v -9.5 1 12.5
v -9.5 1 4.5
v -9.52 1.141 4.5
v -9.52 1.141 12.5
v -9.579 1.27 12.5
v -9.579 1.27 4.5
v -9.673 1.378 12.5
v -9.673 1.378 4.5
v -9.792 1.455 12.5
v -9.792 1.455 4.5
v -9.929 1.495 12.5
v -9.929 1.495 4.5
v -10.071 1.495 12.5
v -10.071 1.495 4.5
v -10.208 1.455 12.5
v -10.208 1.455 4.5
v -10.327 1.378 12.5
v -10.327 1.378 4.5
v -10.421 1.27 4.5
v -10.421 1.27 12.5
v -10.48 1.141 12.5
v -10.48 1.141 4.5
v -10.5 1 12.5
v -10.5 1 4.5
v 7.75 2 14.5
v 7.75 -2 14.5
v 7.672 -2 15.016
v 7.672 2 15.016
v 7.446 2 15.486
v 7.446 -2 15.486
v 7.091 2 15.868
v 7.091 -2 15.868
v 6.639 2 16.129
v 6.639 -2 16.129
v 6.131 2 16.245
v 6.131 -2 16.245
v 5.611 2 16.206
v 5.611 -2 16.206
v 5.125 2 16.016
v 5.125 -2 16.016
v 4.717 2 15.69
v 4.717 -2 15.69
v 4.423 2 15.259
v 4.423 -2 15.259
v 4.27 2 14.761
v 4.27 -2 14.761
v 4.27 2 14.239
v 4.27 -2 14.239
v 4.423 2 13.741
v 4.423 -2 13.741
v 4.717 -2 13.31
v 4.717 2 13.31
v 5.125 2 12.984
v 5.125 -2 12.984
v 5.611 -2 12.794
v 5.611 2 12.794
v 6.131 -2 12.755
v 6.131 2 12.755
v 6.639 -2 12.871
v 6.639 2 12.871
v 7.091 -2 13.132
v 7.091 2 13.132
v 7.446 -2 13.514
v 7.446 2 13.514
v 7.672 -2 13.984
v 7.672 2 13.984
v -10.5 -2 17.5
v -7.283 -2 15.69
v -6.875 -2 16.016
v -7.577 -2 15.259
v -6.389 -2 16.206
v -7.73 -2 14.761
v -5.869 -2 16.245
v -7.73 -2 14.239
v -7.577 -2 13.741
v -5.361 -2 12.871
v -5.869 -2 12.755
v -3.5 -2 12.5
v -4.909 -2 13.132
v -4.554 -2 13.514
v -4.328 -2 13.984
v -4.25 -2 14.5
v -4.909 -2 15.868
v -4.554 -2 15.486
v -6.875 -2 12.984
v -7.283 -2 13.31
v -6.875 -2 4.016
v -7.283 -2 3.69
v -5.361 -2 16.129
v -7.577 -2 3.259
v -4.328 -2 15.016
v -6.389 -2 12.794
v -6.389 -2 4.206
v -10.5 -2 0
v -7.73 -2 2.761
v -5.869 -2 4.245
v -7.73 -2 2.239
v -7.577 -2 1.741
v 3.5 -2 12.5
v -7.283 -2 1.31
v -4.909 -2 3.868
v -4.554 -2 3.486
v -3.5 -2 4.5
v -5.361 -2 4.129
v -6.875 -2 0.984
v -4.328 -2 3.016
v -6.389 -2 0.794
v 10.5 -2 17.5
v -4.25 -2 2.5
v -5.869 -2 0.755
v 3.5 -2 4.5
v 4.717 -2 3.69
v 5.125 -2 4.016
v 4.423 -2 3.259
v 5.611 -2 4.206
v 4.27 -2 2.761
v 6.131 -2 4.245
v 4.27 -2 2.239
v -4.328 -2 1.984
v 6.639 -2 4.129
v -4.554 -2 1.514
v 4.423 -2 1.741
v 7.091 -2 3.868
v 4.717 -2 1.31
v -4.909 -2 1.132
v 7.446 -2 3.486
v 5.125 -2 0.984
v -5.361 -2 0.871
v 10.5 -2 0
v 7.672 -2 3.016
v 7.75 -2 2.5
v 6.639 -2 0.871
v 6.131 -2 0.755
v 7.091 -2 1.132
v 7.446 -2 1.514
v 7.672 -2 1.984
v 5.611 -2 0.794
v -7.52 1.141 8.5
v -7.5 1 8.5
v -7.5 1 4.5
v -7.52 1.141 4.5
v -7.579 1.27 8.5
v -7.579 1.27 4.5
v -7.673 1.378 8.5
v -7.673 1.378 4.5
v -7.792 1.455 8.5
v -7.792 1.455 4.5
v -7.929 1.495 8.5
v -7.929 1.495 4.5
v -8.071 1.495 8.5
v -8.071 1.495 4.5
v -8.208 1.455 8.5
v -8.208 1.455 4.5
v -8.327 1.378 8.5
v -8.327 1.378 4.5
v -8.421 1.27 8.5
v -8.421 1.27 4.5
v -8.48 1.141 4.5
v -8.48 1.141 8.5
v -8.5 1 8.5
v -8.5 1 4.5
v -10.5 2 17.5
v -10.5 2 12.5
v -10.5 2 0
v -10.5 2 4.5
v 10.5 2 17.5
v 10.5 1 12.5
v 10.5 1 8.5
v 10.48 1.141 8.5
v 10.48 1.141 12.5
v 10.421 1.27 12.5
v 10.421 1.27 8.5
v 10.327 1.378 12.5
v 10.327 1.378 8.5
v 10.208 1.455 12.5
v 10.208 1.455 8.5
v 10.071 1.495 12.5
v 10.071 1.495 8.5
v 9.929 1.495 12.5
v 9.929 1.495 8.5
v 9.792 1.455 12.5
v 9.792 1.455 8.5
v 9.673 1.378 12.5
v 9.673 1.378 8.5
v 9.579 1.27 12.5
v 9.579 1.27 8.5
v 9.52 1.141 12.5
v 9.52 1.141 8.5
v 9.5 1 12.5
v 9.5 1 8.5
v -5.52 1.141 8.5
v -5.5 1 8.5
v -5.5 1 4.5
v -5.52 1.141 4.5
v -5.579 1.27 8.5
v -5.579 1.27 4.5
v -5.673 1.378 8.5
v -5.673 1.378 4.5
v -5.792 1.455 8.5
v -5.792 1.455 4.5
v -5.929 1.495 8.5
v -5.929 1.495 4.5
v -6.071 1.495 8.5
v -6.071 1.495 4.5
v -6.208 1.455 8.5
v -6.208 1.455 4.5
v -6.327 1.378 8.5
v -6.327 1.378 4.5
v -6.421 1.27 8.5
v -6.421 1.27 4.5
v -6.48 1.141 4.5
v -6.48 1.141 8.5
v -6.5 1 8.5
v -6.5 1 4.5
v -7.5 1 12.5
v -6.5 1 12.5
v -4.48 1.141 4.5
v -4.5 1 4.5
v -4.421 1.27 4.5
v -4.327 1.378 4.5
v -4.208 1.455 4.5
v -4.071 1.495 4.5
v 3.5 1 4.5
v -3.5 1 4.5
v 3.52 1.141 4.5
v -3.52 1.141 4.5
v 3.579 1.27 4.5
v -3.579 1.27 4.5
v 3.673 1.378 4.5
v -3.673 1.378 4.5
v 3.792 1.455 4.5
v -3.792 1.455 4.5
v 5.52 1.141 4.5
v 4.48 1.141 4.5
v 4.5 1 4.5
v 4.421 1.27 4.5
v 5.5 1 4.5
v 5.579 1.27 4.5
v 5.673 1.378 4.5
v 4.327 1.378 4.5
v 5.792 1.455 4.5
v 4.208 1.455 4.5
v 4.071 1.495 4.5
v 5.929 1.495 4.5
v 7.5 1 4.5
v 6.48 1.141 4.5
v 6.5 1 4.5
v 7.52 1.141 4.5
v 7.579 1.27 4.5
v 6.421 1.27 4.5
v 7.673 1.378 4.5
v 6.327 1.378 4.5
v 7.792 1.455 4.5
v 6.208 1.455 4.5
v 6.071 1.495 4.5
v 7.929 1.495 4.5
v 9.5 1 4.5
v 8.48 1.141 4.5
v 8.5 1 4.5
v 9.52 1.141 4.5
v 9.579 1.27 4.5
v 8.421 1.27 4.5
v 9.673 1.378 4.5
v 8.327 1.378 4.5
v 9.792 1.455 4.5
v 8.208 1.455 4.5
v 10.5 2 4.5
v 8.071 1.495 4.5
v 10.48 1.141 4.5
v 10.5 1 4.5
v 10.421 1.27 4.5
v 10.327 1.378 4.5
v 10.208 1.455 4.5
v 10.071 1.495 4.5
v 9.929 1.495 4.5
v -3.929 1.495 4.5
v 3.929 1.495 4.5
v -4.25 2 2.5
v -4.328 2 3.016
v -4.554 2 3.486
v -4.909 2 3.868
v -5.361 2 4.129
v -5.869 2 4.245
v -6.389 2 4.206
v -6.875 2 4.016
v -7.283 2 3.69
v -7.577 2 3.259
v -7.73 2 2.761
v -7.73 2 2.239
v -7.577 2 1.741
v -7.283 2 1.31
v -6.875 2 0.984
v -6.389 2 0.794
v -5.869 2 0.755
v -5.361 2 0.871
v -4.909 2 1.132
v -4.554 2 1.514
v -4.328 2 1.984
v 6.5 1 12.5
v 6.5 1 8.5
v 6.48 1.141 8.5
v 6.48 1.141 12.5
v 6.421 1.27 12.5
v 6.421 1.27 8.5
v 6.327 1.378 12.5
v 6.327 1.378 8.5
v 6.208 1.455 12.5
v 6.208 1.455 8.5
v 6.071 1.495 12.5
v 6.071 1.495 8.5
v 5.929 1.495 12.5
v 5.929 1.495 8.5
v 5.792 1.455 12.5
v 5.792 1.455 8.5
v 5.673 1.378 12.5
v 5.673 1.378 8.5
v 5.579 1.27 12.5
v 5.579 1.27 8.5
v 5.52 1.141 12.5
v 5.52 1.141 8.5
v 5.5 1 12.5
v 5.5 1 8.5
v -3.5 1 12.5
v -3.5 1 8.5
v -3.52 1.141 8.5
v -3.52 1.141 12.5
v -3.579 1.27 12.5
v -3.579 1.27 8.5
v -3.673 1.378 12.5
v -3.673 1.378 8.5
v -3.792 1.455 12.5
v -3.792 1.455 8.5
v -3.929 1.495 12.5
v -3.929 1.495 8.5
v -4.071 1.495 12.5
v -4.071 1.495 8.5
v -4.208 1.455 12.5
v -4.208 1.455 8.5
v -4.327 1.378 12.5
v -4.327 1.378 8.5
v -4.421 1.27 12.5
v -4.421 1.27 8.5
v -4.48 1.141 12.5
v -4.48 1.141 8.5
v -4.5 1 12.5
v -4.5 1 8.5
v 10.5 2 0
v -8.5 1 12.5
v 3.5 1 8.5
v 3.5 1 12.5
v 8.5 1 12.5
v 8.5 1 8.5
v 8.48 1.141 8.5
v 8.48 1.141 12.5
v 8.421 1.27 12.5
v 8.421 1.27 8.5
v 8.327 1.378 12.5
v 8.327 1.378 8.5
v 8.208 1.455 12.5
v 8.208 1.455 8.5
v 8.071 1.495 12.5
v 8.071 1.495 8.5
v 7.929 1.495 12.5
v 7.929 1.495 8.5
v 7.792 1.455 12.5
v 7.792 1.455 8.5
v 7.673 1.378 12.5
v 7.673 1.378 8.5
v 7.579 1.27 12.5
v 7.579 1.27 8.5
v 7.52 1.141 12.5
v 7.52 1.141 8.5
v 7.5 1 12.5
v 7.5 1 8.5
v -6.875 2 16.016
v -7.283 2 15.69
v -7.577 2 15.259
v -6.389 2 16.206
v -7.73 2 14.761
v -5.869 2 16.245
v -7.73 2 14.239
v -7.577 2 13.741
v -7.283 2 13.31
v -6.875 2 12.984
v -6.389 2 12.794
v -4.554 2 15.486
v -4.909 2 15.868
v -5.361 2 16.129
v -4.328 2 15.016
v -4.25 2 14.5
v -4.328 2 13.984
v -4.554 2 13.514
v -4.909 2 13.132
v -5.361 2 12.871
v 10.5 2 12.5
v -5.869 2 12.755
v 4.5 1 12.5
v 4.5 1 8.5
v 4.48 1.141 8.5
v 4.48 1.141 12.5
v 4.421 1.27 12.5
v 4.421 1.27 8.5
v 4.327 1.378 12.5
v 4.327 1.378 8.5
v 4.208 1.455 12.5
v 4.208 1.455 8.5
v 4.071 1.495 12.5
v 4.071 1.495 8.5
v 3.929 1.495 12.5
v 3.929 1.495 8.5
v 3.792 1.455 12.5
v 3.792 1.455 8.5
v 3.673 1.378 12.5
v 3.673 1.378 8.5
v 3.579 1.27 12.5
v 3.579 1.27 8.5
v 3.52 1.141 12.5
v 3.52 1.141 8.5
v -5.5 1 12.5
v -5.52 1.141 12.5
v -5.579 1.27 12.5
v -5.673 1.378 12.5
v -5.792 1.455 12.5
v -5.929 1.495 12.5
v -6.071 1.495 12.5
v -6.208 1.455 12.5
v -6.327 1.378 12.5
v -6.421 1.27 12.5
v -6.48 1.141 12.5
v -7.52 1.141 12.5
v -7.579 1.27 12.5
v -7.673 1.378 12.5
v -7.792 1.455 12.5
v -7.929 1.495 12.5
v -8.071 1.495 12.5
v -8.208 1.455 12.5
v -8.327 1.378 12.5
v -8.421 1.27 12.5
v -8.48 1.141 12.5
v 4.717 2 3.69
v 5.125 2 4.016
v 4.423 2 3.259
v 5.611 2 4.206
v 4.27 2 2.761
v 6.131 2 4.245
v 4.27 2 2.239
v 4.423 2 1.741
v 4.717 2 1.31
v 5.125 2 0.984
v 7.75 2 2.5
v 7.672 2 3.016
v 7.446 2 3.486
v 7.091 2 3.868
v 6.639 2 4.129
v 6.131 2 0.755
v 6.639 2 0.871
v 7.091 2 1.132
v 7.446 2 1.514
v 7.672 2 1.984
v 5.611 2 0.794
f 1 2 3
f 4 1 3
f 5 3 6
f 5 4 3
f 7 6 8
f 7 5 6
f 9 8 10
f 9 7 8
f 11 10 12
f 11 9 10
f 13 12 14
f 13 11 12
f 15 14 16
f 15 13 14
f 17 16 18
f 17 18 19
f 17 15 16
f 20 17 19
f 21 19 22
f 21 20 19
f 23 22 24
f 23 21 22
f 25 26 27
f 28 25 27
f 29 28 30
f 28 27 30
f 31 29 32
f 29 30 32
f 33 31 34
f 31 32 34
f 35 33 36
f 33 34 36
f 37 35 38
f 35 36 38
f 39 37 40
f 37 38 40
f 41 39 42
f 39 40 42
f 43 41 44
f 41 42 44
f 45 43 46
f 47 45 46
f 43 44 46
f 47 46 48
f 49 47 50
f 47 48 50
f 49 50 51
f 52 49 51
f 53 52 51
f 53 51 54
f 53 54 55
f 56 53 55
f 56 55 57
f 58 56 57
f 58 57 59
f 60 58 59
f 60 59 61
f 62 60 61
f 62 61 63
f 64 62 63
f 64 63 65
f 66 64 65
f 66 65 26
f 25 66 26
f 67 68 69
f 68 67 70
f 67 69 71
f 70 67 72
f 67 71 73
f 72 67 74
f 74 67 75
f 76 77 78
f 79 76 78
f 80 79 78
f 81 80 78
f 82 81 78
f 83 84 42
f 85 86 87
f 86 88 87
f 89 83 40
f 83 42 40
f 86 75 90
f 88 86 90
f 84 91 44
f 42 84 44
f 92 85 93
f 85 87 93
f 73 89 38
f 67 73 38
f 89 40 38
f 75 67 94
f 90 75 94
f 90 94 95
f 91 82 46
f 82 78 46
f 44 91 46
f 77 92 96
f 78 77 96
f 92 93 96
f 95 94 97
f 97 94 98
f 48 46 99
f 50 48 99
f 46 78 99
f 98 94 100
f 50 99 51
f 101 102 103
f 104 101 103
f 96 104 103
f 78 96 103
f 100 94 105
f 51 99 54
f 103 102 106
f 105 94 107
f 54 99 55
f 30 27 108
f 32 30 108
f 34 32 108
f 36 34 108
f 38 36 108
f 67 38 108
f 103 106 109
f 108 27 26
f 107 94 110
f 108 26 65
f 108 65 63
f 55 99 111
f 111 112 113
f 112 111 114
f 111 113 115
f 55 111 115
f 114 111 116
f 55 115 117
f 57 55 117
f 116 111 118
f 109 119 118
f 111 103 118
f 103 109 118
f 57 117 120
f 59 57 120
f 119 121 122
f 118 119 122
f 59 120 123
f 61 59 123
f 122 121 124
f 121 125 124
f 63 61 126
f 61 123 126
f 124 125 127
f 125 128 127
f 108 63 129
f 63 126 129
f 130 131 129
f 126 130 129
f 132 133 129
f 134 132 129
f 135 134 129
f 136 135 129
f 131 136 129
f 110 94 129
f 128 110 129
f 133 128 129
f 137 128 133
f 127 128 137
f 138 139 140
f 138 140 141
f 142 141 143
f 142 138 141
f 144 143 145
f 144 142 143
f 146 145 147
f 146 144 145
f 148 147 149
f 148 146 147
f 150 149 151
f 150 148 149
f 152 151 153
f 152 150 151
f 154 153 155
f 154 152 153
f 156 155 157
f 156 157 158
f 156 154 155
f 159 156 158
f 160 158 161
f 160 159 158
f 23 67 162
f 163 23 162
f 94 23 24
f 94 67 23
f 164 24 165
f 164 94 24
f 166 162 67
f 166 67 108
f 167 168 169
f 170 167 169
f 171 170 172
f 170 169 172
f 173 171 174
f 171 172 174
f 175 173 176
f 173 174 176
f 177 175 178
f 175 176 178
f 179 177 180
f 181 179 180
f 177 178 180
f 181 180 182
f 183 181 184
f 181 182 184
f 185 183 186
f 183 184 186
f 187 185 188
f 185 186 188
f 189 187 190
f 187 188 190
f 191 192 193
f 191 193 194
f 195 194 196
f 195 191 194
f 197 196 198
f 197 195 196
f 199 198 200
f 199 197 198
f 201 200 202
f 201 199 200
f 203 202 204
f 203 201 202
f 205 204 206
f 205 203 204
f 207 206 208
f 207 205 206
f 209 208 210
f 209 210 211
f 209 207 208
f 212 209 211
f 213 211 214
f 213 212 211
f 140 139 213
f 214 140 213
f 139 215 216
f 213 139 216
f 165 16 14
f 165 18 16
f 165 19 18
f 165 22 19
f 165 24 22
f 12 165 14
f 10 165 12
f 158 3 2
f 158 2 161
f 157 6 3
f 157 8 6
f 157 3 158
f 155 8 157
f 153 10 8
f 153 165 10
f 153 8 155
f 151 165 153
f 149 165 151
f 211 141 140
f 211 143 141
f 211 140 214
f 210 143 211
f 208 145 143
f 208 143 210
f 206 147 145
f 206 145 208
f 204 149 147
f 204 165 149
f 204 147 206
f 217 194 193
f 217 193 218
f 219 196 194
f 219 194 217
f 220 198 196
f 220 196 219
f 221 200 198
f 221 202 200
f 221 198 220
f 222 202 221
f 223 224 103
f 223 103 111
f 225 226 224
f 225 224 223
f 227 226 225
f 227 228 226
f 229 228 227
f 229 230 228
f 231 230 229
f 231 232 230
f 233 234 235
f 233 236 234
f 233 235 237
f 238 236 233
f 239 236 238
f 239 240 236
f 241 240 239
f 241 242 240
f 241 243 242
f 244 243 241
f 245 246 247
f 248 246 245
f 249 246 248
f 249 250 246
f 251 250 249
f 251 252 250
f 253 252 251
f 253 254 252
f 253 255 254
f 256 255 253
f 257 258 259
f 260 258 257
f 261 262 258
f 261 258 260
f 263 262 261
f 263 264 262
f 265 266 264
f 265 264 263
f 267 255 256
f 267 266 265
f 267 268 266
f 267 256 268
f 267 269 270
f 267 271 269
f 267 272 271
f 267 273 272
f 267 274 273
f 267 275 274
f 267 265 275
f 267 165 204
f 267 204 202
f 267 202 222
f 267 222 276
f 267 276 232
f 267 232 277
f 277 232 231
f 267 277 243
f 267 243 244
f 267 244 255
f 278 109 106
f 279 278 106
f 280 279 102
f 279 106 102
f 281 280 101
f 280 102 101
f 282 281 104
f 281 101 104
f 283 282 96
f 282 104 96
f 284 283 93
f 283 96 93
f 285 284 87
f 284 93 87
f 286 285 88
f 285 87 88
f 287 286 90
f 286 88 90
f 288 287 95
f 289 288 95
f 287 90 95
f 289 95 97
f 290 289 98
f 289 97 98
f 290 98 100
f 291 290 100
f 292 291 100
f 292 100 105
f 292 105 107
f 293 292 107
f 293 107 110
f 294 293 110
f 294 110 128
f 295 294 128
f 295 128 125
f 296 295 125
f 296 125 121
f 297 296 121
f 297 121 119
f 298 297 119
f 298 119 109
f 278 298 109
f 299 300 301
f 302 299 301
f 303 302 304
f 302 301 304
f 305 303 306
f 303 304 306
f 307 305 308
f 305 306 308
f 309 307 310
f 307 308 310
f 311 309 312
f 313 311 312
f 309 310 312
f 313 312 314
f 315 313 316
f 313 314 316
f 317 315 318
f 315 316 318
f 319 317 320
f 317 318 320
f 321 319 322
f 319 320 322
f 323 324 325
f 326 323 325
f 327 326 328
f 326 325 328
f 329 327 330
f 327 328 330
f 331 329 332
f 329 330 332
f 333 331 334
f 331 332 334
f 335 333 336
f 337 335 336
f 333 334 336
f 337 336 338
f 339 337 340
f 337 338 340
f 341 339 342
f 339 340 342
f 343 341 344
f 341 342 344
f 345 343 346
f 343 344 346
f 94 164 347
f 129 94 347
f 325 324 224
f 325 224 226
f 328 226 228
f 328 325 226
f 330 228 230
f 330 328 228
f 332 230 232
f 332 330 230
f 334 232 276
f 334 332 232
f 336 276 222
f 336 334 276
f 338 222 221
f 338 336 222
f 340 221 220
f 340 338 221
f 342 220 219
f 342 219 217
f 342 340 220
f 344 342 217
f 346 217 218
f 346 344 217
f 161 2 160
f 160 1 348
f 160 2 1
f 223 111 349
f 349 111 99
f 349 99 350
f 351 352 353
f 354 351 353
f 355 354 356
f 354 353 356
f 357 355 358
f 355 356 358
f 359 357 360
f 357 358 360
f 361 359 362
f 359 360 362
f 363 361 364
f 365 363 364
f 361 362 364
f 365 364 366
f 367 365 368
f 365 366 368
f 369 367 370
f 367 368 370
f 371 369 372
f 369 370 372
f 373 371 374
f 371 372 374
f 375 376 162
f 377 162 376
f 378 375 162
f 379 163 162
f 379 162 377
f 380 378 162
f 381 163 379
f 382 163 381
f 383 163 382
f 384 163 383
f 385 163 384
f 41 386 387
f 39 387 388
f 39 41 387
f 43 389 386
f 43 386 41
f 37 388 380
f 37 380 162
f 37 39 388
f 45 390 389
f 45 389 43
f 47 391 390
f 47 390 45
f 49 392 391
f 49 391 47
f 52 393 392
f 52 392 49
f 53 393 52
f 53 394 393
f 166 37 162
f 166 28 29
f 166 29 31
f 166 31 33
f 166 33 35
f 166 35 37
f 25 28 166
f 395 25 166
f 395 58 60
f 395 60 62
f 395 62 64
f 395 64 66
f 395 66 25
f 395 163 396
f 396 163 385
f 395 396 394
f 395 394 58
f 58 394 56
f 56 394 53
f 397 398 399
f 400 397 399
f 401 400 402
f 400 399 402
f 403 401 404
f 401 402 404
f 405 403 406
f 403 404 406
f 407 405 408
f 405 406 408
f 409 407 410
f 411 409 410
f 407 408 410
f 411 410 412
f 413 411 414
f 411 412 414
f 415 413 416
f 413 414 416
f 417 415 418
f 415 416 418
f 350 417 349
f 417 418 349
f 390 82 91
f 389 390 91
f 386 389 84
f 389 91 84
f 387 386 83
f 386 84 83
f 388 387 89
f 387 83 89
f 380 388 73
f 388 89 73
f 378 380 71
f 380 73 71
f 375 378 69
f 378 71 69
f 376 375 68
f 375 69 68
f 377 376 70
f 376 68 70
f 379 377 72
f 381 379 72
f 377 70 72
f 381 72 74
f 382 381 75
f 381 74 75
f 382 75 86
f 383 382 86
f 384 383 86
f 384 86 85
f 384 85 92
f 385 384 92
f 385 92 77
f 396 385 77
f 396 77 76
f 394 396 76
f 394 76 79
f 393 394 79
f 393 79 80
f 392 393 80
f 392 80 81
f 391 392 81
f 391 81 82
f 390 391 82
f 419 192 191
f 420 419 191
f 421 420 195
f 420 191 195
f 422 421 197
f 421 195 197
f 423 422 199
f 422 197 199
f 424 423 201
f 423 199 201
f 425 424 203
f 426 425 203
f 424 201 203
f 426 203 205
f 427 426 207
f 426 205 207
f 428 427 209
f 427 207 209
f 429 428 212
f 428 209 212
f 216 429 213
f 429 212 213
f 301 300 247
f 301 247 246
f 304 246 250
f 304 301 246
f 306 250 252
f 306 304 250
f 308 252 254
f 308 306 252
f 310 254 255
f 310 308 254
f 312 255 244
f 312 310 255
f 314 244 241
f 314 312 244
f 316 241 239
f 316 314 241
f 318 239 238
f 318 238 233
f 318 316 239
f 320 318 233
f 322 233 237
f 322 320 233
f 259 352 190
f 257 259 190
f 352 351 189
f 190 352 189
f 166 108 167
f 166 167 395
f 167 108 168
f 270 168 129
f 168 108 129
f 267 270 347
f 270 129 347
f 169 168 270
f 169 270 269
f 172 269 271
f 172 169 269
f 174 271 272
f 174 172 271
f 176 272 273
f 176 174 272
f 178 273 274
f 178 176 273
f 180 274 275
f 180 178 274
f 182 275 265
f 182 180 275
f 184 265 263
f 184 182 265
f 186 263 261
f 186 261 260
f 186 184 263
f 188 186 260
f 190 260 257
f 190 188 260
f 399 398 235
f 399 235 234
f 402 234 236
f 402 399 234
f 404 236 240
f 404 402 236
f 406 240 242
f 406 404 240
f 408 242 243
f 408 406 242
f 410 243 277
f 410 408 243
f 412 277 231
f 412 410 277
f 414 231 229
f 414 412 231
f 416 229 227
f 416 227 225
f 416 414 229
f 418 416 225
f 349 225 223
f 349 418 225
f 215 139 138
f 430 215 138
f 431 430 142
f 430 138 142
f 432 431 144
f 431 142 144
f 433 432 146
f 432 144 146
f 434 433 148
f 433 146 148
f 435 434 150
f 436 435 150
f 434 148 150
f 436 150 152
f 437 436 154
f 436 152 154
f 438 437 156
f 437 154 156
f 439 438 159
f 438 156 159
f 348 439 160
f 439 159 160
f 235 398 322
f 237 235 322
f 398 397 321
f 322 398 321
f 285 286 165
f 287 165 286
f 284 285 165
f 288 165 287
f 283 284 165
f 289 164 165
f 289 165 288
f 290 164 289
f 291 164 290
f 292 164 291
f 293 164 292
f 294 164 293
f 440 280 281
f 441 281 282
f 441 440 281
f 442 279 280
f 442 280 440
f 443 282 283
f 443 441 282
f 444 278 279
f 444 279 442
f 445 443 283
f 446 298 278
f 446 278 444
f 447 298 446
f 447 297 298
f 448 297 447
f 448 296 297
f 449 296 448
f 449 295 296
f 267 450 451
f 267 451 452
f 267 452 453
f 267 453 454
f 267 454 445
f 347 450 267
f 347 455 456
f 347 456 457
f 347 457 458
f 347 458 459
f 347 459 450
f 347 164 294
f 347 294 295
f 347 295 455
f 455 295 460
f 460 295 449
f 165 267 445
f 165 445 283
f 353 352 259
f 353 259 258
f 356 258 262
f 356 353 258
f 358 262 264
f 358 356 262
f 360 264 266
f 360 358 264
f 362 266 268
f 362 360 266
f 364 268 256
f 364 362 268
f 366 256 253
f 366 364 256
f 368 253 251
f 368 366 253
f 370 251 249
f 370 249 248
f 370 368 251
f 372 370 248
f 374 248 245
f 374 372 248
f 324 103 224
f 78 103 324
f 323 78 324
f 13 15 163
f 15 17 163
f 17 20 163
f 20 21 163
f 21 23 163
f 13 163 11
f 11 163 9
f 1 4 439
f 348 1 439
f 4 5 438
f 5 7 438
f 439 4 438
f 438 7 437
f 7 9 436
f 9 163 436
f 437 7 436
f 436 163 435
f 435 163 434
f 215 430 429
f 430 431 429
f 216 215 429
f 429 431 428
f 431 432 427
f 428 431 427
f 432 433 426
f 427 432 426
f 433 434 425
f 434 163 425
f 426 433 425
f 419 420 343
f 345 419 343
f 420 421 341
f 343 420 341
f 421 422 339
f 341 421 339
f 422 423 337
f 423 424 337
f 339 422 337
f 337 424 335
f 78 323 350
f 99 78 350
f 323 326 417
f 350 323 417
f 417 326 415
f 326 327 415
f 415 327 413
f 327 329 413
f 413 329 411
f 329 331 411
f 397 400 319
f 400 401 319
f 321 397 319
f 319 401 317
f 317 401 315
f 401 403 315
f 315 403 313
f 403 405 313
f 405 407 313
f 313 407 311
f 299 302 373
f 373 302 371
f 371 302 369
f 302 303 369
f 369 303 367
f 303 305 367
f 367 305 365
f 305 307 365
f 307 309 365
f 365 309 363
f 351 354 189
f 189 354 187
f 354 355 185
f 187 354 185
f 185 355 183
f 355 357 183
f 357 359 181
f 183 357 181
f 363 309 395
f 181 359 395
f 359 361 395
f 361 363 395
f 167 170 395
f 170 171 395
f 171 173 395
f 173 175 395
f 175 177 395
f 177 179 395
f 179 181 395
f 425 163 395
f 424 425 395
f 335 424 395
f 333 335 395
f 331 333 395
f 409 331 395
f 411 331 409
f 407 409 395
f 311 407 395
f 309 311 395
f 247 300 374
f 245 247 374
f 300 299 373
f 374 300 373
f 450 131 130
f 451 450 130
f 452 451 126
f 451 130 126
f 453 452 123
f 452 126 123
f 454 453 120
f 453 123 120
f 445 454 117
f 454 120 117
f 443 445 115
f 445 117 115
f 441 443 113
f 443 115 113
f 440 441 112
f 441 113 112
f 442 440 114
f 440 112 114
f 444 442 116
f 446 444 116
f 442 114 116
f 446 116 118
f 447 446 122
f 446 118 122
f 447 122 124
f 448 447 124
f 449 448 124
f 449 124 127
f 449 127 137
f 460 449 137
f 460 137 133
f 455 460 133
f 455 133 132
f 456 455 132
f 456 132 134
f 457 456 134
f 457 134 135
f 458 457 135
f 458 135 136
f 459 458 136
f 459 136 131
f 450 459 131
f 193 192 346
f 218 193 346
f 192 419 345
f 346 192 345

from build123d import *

# Parameters (mm, degrees)
F1_W      = 21
F1_H      = 4
F2_DEPTH  = 17.5
F3_R      = 1.75
F4_DEPTH  = 4.001
F5_W      = 21
F5_H      = 1
F6_DEPTH  = 4
F7_R      = 0.5
F8_DEPTH  = 4
F9_W      = 7
F9_H      = 6.82205
F10_DEPTH = 4


with BuildPart() as f2:
    # F1 (on Top) → F2 (new body)
    with BuildSketch(Plane.XY):
        Rectangle(F1_W, F1_H)
    extrude(amount=F2_DEPTH)

    # F3 (on face) → F4 (cut, through all)
    with BuildSketch(Plane.XZ.offset(2)):
        with Locations((-6, 14.5)):
            Circle(F3_R)
        with Locations((6, 14.5)):
            Circle(F3_R)
        with Locations((6, 2.5)):
            Circle(F3_R)
        with Locations((-6, 2.5)):
            Circle(F3_R)
    extrude(amount=-F4_DEPTH, mode=Mode.SUBTRACT)

    # F5 (on offset) → F6 (cut, symmetric)
    with BuildSketch(Plane.XY.offset(8.5)):
        with Locations((0, 1.5)):
            Rectangle(F5_W, F5_H)
    extrude(amount=F6_DEPTH, both=True, mode=Mode.SUBTRACT)

    # F7 (on offset) → F8 (join, symmetric)
    with BuildSketch(Plane.XY.offset(8.5)):
        with Locations((10, 1)):
            Circle(F7_R)
        with Locations((8, 1)):
            Circle(F7_R)
        with Locations((6, 1)):
            Circle(F7_R)
        with Locations((4, 1)):
            Circle(F7_R)
        with Locations((2, 1)):
            Circle(F7_R)
        with Locations((0, 1)):
            Circle(F7_R)
        with Locations((-2, 1)):
            Circle(F7_R)
        with Locations((-4, 1)):
            Circle(F7_R)
        with Locations((-6, 1)):
            Circle(F7_R)
        with Locations((-8, 1)):
            Circle(F7_R)
        with Locations((-10, 1)):
            Circle(F7_R)
    extrude(amount=F8_DEPTH, both=True)

    # F9 (on offset) → F10 (cut, symmetric)
    with BuildSketch(Plane.XY.offset(8.5)):
        Rectangle(F9_W, F9_H)
    extrude(amount=F10_DEPTH, both=True, mode=Mode.SUBTRACT)


solid = f2.part
